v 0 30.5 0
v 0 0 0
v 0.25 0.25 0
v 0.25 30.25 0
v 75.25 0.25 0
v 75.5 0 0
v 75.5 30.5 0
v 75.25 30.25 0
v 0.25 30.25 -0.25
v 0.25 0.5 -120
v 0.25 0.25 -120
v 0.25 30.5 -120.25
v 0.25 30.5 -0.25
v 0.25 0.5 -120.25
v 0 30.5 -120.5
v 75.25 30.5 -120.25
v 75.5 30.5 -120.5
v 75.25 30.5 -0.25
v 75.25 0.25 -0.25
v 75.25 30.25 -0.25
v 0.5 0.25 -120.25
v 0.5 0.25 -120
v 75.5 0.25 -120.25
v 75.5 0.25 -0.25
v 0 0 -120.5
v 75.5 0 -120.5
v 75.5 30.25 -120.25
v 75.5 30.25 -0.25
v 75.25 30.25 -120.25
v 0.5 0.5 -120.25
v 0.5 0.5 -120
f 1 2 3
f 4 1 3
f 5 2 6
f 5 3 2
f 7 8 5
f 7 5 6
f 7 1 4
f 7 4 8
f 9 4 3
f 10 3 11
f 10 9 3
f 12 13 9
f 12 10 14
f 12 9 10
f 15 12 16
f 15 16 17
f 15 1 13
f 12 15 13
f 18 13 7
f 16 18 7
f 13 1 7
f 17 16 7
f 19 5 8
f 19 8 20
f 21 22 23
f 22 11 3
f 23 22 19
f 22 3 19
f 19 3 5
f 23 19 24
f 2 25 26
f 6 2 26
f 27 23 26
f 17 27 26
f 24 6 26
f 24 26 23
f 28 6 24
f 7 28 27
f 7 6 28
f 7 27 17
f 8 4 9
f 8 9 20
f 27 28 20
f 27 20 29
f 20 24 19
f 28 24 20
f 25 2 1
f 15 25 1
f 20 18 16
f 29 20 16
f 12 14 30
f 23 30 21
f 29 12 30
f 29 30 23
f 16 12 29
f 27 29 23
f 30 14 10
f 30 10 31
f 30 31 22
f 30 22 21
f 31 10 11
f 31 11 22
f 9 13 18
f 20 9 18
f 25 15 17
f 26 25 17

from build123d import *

# Parameters (mm, degrees)
SKETCH2_W           = 75.5
SKETCH2_H           = 30.5
BOSS_EXTRUDE2_DEPTH = 120.5
SKETCH4_W           = 75
SKETCH4_H           = 30
CUT_EXTRUDE1_DEPTH  = 120
SKETCH5_W           = 75
SKETCH5_H           = 120
CUT_EXTRUDE2_DEPTH  = 30
SKETCH6_W           = 120
SKETCH6_H           = 30
CUT_EXTRUDE3_DEPTH  = 75


with BuildPart() as part:
    # Sketch2 → Boss-Extrude2 (new body)
    with BuildSketch(Plane.XY):
        with Locations((37.75, 15.25)):
            Rectangle(SKETCH2_W, SKETCH2_H)
    extrude(amount=-BOSS_EXTRUDE2_DEPTH)

    # Sketch4 → Cut-Extrude1 (cut)
    with BuildSketch(Plane.XY):
        with Locations((37.75, 15.25)):
            Rectangle(SKETCH4_W, SKETCH4_H)
    extrude(amount=-CUT_EXTRUDE1_DEPTH, mode=Mode.SUBTRACT)

    # Sketch5 → Cut-Extrude2 (cut)
    with BuildSketch(Plane(origin=(0, 30.5, 0), x_dir=(1, 0, 0), z_dir=(0, 1, 0))):
        with Locations((37.75, 60.25)):
            Rectangle(SKETCH5_W, SKETCH5_H)
    extrude(amount=-CUT_EXTRUDE2_DEPTH, mode=Mode.SUBTRACT)

    # Sketch6 → Cut-Extrude3 (cut)
    with BuildSketch(Plane(origin=(75.5, 0, 0), x_dir=(0, 0, -1), z_dir=(1, 0, 0))):
        with Locations((60.25, 15.25)):
            Rectangle(SKETCH6_W, SKETCH6_H)
    extrude(amount=-CUT_EXTRUDE3_DEPTH, mode=Mode.SUBTRACT)


solid = part.part
